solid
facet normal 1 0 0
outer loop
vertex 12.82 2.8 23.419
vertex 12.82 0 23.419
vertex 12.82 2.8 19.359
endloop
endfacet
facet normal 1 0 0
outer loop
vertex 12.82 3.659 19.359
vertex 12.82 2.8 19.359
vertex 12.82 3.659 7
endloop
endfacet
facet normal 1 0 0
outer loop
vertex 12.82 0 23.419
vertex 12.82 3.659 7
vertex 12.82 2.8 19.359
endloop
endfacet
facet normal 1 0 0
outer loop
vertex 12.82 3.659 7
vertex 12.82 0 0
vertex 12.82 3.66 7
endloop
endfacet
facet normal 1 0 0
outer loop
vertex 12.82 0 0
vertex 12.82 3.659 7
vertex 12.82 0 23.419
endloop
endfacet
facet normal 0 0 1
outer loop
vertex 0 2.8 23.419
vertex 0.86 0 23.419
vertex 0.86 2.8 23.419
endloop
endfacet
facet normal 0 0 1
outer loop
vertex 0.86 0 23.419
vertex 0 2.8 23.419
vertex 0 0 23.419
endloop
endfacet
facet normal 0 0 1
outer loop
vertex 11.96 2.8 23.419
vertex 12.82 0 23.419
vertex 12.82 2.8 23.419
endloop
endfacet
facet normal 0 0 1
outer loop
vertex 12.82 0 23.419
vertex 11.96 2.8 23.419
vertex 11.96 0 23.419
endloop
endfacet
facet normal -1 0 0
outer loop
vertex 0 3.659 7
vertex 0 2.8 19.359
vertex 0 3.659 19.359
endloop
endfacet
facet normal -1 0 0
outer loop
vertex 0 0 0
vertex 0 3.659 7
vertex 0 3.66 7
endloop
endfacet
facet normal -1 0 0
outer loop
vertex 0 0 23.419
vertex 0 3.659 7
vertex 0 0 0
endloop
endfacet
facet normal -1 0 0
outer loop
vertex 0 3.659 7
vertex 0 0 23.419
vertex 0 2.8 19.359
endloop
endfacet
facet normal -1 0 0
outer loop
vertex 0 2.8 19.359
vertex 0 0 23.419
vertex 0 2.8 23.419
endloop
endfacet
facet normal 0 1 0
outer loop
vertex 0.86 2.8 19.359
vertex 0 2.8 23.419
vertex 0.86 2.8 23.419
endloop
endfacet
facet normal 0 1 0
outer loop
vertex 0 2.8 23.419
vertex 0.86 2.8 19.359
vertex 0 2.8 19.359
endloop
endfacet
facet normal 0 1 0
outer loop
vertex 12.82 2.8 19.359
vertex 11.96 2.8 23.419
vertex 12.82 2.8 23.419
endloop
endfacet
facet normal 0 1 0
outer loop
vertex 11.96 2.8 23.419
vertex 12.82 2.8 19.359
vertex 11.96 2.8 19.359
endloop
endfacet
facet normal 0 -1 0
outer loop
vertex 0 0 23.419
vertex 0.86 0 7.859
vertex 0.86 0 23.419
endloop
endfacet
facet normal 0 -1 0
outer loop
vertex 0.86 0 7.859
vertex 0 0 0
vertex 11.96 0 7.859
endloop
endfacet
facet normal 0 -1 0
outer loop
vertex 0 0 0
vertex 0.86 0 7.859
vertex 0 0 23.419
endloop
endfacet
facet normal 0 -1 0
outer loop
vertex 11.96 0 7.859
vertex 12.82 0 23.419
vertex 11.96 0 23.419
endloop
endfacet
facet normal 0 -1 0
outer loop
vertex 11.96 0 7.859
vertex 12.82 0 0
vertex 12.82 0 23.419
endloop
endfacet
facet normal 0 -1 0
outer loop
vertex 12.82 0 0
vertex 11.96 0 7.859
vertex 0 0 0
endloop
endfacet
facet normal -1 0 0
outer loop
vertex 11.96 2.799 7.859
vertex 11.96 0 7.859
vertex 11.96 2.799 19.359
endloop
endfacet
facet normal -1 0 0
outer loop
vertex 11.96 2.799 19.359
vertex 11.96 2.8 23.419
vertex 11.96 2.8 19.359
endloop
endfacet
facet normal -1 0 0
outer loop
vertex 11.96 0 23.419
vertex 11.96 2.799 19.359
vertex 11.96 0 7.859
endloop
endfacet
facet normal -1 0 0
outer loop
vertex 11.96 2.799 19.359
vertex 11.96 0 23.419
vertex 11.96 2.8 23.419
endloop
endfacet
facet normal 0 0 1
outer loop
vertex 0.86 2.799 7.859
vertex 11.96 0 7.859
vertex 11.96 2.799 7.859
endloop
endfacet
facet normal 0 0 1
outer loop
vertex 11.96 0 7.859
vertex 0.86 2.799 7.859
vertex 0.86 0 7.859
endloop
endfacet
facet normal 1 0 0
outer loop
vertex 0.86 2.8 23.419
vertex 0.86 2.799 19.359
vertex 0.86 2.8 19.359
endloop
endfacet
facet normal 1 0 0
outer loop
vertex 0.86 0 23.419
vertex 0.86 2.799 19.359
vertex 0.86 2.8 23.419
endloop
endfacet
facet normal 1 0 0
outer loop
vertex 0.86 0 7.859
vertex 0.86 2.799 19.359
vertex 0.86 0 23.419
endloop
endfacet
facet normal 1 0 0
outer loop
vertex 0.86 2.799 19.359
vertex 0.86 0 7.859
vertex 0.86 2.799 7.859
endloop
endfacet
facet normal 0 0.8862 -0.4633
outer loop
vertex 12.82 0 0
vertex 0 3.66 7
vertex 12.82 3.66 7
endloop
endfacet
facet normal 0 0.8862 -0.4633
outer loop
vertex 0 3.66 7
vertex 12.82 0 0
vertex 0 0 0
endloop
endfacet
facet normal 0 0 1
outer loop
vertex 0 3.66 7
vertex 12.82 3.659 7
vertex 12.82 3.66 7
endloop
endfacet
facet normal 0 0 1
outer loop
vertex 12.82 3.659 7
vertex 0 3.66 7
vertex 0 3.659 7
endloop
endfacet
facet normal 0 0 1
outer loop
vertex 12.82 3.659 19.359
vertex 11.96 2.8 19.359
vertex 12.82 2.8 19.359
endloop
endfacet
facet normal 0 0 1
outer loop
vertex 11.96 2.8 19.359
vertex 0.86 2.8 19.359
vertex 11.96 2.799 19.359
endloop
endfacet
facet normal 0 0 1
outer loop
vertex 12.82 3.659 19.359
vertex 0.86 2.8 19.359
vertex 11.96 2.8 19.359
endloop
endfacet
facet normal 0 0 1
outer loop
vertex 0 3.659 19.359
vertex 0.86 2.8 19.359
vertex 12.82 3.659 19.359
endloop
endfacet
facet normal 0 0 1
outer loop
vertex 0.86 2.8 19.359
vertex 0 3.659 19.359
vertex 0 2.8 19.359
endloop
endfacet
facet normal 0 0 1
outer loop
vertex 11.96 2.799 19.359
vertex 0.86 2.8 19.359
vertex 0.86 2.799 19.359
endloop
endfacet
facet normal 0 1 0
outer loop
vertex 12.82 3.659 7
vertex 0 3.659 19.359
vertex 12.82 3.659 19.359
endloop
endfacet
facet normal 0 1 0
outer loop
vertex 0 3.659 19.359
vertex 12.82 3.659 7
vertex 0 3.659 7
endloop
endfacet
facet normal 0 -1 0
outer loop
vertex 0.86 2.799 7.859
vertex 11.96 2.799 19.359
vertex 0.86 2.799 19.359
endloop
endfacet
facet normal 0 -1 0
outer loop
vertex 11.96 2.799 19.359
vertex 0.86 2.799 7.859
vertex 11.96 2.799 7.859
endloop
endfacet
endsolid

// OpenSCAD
// file: prism.scad
// -----------------------------------------------------------------------------
// 3D-Model (OpenSCAD) of a prism
//
// Author: Bernhard Bablok
// License: GPL3
//
// Website: https://github.com/bablokb/pi-webradio
//
// -----------------------------------------------------------------------------

use <MCAD/triangles.scad>

module prism(x,y,z,plane="xy") {
  // plane is the plane of the degenerated triangle
  if (plane == "yz")
    translate([x,0,0]) rotate([0,-90,0]) triangle(y,z,x);
  else if (plane == "xz")
    translate([0,y,0]) rotate([90,0,0]) triangle(z,x,y);
  else if (plane == "xy")
    triangle(y,x,z);
}
// main file
// -----------------------------------------------------------------------------
// 3D-Model (OpenSCAD) of touch-connector
//
// This is just a holder for a small touch-sensor breakout.
//
// Author: Bernhard Bablok
// License: GPL3
//
// Website: https://github.com/bablokb/pi-webradio
//
// -----------------------------------------------------------------------------

$fa = 1;
$fs = 0.4;

fuzz = 0.001;

use <prism.scad>

module touch_conn() {
  tw = 0.86;    // wall thickness
  tx = 12.82;
  ty = 3.66;
  tpz = 7;       // z of prism
  tcy = 2.8;     // y of outer-cube
  tcz = 16.42;   // z of outer-cube
  tbz = 12.36;   // z of back-cube

  color("lightblue") translate([tx,0,tpz]) rotate([0,180,0]) prism(tx,ty,tpz,plane="yz");
  translate([0,0,tpz-fuzz]) difference() {
    cube([tx,tcy,tcz]);                                                // outer-cube
    translate([tw,-fuzz,tw]) cube([tx-2*tw,tcy+2*fuzz,tcz-tw+fuzz]);   // inner-cube
  };
  color("lightpink") translate([0,ty-tw-fuzz,tpz-fuzz]) cube([tx,tw,tbz]);       // back
}

touch_conn();

//color("pink") translate([231.87,1.67,45.58]) touch_conn();
